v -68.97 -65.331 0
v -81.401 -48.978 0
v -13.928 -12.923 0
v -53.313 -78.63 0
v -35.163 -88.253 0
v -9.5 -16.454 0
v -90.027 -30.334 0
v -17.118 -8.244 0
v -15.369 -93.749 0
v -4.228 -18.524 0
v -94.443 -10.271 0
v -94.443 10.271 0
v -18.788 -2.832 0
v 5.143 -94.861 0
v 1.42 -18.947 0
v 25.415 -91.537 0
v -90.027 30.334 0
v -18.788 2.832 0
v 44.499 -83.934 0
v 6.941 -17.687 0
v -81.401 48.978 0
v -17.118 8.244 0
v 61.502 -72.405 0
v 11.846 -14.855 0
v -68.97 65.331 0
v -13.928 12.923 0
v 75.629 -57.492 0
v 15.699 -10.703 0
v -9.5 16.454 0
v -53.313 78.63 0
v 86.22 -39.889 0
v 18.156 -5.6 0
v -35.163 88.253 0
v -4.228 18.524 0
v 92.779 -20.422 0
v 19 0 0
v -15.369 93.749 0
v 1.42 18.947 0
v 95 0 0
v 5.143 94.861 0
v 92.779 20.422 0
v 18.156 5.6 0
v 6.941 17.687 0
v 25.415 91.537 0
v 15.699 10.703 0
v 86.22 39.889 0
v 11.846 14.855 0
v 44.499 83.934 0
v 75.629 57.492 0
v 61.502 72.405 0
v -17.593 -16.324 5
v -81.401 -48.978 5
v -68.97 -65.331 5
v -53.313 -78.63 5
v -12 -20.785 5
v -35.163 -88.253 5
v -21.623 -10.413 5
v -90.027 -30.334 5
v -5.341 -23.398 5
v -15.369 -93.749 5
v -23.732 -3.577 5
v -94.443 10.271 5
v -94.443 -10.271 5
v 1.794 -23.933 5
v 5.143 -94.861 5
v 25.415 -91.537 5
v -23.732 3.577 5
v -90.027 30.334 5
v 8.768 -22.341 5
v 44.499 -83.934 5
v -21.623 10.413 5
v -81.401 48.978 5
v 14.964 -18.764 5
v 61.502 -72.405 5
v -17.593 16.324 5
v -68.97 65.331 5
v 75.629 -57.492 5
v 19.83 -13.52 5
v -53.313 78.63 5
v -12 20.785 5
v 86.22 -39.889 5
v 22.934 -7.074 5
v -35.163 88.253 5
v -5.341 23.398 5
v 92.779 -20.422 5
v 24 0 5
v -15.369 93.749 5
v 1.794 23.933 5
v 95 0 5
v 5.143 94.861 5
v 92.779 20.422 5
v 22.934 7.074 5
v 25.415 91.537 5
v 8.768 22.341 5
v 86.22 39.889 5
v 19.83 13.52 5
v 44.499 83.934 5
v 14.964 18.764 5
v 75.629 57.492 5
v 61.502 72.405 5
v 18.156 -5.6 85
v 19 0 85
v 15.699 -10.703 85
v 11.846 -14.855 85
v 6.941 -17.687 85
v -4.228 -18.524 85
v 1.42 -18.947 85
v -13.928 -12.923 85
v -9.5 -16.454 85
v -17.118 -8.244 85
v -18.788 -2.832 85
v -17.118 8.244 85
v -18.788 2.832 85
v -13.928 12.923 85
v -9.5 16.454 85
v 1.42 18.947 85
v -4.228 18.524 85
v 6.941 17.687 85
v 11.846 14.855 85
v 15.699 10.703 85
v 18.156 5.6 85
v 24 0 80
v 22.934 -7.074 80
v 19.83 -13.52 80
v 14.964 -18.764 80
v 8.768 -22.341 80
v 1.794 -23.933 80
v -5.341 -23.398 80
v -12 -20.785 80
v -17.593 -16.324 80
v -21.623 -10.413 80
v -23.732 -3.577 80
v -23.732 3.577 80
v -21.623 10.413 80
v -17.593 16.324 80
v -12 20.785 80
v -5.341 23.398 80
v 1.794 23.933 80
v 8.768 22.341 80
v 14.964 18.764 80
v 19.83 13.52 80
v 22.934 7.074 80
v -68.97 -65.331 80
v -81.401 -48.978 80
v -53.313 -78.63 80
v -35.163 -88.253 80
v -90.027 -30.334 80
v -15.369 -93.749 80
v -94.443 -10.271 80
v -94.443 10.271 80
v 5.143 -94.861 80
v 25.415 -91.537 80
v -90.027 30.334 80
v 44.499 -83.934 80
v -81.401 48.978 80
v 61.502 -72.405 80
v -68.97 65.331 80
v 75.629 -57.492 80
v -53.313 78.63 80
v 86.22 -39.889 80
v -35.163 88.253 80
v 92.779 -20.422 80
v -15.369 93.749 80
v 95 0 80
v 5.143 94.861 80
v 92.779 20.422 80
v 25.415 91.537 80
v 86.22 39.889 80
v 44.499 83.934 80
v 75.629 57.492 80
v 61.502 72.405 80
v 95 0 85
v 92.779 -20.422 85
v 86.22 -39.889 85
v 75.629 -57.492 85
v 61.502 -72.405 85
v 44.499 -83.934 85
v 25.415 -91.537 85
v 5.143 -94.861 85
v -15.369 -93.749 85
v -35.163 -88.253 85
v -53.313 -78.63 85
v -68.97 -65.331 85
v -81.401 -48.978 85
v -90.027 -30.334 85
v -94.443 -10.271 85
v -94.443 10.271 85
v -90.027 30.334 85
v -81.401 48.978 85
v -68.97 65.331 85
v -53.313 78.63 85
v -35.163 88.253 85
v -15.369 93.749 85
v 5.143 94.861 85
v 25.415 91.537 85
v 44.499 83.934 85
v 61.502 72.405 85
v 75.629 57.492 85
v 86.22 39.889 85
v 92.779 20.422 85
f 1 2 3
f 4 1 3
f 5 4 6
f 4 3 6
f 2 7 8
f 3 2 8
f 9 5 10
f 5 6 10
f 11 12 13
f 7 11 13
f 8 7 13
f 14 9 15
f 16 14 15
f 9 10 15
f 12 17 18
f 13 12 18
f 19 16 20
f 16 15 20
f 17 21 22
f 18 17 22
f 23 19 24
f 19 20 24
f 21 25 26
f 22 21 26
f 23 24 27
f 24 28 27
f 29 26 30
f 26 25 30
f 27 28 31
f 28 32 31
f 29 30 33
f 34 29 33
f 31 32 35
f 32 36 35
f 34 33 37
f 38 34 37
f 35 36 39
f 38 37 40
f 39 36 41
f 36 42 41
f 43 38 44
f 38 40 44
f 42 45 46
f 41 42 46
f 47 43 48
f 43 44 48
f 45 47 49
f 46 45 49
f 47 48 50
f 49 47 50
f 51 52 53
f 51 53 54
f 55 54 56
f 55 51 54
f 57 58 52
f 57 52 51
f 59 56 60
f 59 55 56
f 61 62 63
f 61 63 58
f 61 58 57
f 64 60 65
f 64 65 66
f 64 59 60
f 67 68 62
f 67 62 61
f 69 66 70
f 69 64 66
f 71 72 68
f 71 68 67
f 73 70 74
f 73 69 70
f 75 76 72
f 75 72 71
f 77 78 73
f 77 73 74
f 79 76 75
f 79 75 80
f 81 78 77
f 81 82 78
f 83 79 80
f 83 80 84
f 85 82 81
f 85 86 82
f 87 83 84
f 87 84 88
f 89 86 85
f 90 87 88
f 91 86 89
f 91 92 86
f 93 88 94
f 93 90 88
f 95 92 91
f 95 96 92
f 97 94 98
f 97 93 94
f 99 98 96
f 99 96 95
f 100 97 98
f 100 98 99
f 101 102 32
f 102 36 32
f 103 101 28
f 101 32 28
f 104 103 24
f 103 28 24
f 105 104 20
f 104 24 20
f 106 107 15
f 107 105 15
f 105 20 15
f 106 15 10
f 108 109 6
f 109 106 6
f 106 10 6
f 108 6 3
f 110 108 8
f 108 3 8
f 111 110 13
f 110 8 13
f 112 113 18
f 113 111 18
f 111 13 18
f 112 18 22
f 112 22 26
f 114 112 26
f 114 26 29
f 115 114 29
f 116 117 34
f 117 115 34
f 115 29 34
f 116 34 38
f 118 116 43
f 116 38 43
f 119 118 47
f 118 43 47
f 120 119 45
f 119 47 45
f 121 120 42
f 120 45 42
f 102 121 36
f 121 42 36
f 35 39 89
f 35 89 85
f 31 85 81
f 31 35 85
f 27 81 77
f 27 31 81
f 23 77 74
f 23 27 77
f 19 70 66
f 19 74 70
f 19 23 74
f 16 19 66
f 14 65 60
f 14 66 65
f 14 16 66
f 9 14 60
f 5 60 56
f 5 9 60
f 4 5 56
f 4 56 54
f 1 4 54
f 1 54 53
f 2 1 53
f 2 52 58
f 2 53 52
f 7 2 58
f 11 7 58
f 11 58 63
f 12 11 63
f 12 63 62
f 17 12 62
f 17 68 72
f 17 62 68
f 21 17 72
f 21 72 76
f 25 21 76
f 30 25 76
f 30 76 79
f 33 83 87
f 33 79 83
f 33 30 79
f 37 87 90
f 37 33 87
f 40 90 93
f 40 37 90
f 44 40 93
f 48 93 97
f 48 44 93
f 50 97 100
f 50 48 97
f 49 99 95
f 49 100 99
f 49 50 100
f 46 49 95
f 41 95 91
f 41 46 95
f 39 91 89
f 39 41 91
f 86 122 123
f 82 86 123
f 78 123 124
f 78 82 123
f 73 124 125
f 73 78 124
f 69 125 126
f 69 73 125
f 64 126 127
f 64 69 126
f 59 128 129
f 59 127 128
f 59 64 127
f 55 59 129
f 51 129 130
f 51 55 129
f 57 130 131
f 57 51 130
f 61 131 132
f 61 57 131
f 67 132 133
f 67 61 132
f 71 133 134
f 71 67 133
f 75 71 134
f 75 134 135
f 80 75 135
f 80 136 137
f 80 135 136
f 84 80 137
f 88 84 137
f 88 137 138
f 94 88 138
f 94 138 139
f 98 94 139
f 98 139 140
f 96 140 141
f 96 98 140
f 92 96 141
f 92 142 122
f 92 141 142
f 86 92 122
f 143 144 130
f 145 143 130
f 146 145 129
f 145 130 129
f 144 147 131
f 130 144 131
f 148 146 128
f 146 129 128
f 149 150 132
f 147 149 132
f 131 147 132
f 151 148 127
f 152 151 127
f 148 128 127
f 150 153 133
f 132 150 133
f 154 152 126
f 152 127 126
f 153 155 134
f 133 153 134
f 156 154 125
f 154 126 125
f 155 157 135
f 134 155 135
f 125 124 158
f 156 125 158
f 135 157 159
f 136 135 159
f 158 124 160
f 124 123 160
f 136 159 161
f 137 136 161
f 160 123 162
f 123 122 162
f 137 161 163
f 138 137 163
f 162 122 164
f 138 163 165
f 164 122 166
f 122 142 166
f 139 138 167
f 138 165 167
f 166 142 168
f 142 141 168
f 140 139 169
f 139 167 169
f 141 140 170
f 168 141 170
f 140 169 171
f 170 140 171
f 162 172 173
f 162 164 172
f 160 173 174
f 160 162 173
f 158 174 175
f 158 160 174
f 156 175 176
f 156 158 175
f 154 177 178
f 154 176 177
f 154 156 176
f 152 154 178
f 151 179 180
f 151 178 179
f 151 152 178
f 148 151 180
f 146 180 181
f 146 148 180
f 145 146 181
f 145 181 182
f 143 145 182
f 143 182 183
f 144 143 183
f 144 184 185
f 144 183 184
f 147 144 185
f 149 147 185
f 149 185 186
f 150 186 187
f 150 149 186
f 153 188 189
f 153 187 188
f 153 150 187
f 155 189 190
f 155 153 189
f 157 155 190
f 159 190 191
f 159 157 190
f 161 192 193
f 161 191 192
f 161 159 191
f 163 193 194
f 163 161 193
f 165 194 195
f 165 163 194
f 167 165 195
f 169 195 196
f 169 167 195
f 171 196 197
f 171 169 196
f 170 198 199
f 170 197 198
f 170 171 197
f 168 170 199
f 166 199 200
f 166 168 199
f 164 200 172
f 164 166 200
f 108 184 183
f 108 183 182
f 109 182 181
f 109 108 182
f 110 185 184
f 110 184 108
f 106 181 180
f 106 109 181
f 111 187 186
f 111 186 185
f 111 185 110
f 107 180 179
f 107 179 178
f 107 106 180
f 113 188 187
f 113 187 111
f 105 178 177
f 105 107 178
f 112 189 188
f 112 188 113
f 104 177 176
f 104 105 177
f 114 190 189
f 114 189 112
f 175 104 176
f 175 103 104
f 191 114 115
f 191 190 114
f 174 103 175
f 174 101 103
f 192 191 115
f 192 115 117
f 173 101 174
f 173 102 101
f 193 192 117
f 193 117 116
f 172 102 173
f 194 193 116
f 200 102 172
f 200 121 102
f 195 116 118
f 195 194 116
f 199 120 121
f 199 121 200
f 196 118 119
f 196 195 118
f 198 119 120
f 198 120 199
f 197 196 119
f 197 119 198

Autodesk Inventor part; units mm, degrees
ref_plane "YZ Plane" through (0, 0, 0) normal (1, 0, 0) x (0, 1, 0)
ref_plane "XZ Plane" through (0, 0, 0) normal (0, 1, 0) x (-1, 0, 0)
ref_plane "XY Plane" through (0, 0, 0) normal (0, 0, 1) x (1, 0, 0)
sketch "Sketch1" plane through (0, 0, 0) normal (0, 0, 1) x (1, 0, 0)
  circle A0 centre (0, 0) radius 95
  circle A1 centre (0, 0) radius 19
  dimension "d0" = 38
  dimension "d2" = 190
extrude "Extrusion1" add sketch "Sketch1" along normal blind 5
sketch "Sketch2" plane through (0, 0, 5) normal (0, 0, 1) x (1, 0, 0)
  circle A0 centre (0, 0) radius 19 projected
  circle A1 centre (0, 0) radius 95 projected
  circle A2 centre (0, 0) radius 24
  dimension "d5" = 5
extrude "Extrusion2" add sketch "Sketch2" along normal blind 75 contours A2
sketch "Sketch3" plane through (0, 0, 80) normal (0, 0, 1) x (1, 0, 0)
  circle A0 centre (0, 0) radius 19 projected
  circle A1 centre (0, 0) radius 24 projected
  circle A2 centre (0, 0) radius 95 projected
extrude "Extrusion3" add sketch "Sketch3" along normal blind 5 contours A1 | A2
properties part number "spool"
